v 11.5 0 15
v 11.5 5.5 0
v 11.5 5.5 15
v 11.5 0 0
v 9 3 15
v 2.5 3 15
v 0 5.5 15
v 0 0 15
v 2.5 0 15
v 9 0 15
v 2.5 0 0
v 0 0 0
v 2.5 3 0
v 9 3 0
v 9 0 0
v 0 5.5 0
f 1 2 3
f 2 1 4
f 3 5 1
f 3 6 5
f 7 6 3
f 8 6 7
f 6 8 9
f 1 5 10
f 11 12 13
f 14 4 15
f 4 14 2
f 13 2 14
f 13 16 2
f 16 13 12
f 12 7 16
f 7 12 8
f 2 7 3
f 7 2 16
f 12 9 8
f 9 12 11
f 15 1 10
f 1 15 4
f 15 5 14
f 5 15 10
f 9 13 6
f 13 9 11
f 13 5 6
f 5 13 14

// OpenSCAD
THICKNESS = 6.5;
LENGTH = 15;
WALL = 2.5;
WIDTH = 3;

difference()
{
	cube([WALL*2+THICKNESS, WALL+WIDTH, LENGTH]);
	translate([WALL,0,0])cube([THICKNESS, WIDTH, LENGTH]);
	
}
